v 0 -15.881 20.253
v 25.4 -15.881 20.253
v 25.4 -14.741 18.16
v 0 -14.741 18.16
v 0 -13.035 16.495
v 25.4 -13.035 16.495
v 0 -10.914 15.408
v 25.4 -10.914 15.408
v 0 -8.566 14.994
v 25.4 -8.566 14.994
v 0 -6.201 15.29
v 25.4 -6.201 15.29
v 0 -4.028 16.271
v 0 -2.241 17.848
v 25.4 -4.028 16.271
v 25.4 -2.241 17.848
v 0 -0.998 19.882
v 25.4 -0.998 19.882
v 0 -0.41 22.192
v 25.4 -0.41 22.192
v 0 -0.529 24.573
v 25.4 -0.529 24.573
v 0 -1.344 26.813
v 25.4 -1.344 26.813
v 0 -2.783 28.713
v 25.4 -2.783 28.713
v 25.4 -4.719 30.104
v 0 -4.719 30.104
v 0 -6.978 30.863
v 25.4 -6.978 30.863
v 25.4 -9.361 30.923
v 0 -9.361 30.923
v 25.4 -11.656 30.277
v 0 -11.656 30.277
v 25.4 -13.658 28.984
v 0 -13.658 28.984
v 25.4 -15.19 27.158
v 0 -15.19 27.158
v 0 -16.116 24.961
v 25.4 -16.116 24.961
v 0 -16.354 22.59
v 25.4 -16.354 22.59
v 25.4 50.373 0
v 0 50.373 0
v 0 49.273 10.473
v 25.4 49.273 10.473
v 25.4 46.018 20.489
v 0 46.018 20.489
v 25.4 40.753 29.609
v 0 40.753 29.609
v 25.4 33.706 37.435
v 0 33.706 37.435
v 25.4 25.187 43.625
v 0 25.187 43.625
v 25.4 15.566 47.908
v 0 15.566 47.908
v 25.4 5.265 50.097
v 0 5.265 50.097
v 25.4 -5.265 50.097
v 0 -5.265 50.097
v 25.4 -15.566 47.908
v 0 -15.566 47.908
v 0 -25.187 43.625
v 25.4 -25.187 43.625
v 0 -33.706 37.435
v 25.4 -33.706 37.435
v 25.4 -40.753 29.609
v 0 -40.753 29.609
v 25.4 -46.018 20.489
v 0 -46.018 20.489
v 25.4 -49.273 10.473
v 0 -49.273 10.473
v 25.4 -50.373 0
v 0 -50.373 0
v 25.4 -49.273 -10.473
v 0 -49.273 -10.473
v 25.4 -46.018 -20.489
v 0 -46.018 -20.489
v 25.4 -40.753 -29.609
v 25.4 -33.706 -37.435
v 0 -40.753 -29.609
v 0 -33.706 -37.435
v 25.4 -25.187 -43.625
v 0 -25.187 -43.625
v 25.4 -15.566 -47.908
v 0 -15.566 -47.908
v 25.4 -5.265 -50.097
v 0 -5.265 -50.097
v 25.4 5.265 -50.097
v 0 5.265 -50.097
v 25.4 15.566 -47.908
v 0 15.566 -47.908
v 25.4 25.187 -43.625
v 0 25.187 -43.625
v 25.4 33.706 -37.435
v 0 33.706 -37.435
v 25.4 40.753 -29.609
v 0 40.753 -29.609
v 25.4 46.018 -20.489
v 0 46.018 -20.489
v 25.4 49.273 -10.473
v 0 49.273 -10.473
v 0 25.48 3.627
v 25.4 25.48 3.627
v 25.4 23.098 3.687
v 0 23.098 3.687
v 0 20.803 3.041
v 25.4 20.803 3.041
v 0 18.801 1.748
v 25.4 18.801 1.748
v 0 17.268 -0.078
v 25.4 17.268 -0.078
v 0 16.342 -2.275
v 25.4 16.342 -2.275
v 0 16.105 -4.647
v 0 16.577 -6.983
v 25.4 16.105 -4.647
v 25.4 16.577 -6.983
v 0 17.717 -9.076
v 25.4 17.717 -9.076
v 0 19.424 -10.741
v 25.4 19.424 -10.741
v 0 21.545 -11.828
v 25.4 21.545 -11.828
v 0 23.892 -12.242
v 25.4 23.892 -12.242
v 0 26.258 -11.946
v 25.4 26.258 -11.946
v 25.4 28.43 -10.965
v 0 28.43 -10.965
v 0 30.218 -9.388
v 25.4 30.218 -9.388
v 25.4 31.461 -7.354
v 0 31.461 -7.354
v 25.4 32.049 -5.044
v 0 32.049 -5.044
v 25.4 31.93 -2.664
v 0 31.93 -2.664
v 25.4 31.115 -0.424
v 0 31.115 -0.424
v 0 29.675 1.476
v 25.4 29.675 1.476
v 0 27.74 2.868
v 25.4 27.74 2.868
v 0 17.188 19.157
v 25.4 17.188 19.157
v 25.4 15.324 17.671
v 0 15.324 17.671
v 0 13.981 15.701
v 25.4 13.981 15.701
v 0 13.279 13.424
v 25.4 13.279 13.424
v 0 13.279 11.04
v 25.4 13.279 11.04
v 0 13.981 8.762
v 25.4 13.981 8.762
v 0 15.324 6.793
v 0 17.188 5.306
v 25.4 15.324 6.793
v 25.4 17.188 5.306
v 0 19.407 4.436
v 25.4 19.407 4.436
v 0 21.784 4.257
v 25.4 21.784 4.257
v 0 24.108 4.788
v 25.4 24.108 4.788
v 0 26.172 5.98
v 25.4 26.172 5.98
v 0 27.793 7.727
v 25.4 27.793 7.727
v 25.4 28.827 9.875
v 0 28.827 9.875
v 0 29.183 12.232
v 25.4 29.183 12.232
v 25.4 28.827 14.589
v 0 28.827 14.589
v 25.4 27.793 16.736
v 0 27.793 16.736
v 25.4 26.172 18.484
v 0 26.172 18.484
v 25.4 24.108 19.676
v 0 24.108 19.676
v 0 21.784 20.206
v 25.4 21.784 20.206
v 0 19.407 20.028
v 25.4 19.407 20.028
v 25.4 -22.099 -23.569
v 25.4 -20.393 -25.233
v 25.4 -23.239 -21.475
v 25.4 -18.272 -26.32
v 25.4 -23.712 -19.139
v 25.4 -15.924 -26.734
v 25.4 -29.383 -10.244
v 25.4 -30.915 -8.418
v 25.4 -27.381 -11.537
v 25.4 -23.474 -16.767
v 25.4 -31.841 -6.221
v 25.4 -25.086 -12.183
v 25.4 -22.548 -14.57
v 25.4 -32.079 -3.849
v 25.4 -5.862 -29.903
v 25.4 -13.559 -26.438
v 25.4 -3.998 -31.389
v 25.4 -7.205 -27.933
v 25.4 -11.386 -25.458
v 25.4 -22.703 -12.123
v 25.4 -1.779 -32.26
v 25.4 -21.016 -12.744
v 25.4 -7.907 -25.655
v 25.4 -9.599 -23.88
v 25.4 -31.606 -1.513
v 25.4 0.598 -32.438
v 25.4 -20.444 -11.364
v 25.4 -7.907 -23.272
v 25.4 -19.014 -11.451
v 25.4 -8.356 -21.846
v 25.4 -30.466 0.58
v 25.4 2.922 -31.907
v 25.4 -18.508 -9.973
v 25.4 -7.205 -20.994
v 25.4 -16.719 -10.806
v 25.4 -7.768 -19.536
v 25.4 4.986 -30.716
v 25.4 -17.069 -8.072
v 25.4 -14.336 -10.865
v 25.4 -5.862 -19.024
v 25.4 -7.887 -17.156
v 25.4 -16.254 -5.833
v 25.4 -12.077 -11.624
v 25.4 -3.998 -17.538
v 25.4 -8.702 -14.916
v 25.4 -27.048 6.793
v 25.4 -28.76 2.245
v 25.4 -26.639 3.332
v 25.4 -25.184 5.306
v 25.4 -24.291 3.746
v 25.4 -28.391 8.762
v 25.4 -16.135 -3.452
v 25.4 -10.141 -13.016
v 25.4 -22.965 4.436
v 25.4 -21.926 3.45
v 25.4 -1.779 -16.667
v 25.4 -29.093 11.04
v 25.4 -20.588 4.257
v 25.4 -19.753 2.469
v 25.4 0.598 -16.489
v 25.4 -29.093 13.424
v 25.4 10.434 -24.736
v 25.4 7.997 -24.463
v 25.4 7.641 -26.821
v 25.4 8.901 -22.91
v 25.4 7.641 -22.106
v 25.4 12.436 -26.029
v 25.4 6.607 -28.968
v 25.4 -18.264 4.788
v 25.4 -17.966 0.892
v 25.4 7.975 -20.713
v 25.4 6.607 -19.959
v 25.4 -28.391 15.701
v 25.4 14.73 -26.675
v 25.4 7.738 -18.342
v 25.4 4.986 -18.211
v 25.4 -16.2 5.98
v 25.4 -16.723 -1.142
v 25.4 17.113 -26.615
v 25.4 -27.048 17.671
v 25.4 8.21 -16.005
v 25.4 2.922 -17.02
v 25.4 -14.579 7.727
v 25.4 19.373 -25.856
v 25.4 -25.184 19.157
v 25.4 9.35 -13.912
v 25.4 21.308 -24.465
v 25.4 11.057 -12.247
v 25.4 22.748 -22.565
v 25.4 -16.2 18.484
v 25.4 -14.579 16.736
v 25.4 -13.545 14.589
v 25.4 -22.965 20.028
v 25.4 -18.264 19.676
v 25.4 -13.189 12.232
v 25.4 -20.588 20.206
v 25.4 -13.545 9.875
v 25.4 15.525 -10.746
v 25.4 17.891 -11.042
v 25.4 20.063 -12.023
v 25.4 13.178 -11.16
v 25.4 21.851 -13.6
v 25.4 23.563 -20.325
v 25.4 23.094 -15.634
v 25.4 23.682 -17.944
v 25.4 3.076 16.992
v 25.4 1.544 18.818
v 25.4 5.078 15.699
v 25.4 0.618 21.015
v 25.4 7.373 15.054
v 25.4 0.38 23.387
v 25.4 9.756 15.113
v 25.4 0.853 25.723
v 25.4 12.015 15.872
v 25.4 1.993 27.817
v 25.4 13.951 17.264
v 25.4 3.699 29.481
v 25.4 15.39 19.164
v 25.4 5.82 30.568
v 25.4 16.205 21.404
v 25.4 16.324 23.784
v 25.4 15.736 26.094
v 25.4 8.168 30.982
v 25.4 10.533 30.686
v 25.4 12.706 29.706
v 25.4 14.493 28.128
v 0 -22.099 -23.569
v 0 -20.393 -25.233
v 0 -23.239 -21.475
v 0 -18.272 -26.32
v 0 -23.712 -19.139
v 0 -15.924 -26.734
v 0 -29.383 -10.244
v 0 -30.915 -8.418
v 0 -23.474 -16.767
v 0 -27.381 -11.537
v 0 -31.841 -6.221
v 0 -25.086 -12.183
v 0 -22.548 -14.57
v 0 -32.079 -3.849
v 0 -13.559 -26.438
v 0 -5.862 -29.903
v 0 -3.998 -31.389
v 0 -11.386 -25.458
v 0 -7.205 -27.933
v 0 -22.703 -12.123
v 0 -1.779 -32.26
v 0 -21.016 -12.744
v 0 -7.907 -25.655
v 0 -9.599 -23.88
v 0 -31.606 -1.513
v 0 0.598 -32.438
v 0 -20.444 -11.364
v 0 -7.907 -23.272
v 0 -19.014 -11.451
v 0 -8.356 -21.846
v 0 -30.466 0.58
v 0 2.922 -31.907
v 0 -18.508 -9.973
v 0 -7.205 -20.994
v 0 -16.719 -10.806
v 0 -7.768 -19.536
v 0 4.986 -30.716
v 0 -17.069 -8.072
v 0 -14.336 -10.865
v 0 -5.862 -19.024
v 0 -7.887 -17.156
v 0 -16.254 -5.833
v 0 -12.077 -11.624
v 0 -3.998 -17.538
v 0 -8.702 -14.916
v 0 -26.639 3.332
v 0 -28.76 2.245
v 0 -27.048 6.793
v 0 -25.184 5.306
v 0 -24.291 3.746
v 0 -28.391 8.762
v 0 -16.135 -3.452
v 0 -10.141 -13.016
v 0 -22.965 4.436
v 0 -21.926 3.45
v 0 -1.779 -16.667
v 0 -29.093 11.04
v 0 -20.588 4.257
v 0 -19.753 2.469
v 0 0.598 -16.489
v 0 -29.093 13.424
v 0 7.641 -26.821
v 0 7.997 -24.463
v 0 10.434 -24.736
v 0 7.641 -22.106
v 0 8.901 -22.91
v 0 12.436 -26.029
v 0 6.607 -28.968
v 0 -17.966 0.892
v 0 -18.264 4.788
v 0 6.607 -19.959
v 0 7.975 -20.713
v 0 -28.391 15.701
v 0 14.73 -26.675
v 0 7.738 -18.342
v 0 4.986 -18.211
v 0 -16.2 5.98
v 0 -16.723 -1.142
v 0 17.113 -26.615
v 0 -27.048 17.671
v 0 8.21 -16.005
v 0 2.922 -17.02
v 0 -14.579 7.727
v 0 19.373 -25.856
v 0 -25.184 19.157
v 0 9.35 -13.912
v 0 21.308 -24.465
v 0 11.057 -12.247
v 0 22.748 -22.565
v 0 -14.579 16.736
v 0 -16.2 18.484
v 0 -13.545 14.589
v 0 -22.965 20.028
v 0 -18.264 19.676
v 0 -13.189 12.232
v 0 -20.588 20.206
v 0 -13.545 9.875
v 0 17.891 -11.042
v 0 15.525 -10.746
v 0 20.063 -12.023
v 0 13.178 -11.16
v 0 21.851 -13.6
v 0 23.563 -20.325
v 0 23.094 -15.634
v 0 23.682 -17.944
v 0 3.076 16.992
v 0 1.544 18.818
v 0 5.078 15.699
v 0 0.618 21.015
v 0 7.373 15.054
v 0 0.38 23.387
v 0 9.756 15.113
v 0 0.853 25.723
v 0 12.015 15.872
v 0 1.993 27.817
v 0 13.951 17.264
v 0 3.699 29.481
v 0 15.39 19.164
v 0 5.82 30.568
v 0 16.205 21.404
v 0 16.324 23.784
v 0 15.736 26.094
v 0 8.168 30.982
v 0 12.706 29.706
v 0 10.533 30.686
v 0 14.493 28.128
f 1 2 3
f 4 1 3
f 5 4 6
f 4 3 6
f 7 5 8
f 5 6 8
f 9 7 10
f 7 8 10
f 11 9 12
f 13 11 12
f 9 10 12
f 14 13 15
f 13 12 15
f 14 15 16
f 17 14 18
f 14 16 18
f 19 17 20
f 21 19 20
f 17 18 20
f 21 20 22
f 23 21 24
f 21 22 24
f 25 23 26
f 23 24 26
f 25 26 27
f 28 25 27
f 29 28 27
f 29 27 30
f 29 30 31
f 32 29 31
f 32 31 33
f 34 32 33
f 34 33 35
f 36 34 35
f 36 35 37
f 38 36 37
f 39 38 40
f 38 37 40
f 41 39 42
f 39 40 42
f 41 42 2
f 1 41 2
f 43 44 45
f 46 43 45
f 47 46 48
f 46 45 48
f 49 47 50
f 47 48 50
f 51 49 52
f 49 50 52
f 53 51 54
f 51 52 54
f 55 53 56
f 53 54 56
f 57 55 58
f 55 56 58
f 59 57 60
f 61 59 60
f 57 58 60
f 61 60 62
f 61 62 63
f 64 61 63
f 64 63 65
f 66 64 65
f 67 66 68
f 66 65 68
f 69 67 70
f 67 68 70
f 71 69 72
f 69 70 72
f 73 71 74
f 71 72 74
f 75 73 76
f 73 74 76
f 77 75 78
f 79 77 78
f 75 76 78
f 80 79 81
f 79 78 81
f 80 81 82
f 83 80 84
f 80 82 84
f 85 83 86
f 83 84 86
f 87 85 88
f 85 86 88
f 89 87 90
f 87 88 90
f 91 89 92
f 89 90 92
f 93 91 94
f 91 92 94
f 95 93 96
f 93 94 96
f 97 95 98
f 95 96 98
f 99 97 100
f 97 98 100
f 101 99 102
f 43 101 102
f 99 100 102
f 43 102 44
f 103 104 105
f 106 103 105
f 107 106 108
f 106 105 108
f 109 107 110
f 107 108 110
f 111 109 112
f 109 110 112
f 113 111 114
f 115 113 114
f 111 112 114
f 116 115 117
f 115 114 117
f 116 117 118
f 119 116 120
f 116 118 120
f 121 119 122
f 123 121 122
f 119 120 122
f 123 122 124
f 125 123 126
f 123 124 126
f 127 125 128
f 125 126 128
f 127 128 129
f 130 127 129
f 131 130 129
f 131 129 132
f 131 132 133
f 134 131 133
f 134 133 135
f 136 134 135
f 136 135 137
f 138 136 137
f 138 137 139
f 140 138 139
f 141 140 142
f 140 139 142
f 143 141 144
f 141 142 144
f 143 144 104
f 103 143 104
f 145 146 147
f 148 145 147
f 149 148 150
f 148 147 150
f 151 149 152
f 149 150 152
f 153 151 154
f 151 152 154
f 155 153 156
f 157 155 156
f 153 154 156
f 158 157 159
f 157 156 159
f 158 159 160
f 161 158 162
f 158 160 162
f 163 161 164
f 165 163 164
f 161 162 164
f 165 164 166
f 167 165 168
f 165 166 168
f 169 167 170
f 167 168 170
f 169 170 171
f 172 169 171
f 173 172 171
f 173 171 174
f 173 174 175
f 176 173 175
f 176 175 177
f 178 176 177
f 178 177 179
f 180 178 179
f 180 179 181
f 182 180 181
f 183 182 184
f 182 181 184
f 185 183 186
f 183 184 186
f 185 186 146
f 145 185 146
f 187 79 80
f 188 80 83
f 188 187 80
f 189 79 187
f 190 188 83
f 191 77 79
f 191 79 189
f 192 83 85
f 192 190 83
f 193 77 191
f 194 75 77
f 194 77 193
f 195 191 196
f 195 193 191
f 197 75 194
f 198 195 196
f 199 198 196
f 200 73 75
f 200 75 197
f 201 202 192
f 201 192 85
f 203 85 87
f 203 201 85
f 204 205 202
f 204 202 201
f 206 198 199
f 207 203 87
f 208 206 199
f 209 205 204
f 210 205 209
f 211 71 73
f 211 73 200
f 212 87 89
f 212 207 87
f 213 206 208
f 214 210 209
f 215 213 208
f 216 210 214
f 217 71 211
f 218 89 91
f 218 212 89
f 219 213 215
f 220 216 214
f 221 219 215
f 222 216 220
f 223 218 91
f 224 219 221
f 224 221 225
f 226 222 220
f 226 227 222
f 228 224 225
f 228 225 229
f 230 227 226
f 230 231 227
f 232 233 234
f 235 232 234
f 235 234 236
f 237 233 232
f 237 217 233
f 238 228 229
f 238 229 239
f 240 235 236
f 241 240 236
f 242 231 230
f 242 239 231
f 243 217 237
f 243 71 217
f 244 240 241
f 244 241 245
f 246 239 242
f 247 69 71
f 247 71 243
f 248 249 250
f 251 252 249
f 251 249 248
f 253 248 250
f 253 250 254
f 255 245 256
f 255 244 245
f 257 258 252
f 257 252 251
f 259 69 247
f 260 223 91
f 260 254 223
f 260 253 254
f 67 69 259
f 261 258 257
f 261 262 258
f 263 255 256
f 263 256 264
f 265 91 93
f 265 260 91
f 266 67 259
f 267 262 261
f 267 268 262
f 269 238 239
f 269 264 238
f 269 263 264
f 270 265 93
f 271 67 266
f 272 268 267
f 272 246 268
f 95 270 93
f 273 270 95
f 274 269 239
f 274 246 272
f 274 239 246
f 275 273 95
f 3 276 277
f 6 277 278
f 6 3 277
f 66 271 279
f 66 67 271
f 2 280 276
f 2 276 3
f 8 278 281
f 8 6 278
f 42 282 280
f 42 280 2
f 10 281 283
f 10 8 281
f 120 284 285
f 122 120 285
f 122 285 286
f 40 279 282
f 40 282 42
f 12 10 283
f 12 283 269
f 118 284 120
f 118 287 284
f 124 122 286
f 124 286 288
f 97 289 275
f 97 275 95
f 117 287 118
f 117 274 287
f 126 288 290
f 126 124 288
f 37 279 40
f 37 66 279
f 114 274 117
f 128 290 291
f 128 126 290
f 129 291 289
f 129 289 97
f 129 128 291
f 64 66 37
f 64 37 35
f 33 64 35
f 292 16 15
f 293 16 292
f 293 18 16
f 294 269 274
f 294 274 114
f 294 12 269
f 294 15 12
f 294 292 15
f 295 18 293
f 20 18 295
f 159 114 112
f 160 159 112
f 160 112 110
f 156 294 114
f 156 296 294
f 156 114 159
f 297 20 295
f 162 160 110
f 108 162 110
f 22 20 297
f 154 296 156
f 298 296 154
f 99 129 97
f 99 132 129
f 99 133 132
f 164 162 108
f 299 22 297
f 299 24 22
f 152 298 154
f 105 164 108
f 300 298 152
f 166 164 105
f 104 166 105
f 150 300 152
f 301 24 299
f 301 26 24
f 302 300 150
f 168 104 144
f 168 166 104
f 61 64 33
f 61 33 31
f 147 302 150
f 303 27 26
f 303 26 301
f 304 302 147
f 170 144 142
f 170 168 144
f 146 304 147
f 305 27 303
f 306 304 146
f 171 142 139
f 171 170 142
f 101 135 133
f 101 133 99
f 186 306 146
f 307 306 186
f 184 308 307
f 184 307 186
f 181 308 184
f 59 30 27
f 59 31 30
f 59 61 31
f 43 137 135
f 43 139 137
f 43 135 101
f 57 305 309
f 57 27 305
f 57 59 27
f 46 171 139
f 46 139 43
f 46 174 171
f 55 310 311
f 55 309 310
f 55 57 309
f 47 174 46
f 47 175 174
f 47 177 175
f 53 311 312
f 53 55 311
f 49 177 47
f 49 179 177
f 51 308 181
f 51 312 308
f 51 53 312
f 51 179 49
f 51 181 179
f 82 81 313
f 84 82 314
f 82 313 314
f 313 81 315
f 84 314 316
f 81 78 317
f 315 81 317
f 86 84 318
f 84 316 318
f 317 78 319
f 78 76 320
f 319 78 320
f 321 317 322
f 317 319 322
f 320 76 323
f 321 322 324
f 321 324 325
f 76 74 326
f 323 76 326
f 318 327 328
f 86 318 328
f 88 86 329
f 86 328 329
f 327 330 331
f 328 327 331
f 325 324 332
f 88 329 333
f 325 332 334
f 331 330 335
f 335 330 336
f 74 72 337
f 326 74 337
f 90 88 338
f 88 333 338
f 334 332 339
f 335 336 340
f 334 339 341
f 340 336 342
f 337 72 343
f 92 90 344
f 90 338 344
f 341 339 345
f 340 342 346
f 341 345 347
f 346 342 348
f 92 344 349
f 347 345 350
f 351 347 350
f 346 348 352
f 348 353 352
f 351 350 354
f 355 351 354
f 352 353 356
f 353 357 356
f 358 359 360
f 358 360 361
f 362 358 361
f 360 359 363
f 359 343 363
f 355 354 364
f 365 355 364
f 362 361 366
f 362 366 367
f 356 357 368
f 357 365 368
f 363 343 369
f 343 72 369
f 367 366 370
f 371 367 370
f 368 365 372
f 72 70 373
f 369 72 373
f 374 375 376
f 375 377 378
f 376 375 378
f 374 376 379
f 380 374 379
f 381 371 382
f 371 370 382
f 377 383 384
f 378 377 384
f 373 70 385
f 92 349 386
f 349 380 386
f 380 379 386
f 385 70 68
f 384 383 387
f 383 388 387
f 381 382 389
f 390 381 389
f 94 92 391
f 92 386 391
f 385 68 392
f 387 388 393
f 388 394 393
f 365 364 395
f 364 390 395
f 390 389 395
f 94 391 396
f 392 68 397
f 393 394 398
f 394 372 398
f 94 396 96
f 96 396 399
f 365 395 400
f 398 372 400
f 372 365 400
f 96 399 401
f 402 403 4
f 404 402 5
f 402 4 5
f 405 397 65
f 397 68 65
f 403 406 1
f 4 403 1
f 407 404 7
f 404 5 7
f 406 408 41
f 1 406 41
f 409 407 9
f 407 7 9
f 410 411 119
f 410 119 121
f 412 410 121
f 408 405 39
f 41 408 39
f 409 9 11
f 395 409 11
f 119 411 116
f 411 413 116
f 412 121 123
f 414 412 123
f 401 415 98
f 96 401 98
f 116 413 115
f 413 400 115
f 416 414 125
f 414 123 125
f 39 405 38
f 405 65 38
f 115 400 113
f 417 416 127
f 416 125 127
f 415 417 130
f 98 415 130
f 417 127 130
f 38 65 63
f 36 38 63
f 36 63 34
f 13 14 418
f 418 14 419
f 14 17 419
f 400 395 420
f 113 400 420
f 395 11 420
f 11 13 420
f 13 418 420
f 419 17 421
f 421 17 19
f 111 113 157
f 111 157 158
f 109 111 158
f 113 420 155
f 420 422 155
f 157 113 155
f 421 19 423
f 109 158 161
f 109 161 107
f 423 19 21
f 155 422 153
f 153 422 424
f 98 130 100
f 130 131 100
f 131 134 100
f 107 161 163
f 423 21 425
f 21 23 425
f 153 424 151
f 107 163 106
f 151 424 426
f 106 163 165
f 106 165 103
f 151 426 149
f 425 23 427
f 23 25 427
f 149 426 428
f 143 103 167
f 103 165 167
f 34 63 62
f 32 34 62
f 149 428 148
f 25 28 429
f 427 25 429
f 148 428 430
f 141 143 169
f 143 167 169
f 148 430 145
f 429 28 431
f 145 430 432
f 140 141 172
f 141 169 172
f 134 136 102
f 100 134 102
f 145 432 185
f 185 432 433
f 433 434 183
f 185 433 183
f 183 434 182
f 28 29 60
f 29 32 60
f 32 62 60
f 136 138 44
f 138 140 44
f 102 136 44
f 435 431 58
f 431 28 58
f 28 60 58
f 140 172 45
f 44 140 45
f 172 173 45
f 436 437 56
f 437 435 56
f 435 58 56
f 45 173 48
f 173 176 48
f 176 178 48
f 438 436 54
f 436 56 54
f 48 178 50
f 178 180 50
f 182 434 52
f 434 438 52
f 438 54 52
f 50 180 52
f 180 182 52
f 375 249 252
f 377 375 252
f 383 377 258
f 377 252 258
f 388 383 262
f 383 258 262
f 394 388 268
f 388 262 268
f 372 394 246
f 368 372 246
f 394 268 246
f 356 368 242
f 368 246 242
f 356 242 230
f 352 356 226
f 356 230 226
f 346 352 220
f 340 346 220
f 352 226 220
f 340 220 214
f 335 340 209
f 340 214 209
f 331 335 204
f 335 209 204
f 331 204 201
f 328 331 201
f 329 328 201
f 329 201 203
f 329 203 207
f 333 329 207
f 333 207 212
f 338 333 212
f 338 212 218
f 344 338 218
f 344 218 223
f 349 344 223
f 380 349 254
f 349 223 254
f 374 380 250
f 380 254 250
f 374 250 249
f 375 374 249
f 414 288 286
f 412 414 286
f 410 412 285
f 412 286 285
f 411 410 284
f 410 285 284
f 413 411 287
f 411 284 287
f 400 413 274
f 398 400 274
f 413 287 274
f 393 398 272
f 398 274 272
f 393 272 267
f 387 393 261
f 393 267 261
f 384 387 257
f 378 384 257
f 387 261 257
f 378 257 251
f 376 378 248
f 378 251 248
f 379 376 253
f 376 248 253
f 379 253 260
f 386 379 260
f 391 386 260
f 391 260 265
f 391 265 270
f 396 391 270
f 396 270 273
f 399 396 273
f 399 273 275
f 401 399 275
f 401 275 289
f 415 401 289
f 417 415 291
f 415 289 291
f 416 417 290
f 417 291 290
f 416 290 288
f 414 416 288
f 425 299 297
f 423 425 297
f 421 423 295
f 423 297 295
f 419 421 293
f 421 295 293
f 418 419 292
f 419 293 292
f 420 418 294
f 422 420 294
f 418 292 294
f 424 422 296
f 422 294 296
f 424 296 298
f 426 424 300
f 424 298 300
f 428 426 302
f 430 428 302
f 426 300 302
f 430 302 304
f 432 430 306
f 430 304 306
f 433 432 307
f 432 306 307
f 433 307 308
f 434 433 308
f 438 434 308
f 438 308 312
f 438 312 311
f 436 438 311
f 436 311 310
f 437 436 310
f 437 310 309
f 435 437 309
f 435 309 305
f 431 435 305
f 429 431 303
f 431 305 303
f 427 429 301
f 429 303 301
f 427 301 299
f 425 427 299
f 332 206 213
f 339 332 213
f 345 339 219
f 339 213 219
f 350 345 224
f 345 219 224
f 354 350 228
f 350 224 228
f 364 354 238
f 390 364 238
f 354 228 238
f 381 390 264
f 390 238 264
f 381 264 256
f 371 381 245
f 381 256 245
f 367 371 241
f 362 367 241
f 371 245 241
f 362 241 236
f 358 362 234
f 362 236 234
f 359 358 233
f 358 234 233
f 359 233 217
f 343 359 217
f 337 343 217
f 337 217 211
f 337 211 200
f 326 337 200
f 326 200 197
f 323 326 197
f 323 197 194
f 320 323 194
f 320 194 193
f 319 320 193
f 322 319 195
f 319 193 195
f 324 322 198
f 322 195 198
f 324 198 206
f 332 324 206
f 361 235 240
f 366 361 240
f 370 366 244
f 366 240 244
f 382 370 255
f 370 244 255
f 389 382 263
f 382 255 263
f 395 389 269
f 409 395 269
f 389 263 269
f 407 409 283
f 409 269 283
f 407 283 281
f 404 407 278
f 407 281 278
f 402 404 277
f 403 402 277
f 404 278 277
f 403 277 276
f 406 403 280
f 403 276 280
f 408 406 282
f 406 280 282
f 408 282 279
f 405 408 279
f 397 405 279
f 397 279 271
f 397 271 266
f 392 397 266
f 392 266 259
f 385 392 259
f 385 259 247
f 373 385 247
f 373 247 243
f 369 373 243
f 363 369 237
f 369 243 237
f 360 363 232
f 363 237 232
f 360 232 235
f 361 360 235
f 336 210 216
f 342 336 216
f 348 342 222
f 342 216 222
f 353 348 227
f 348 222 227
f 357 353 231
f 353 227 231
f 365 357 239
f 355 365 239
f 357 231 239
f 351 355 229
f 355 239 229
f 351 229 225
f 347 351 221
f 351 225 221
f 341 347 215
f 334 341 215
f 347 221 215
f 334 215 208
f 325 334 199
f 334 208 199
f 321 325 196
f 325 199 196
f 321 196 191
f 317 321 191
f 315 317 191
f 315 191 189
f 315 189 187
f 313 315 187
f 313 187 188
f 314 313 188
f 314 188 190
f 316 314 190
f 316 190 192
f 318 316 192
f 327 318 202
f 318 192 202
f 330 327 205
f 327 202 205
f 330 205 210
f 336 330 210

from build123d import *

# Parameters (mm, degrees)
F0_R            = 50.3734102362
F1_DEPTH        = 25.4
F2_R            = 7.9966512346
F3_DEPTH        = 25.4
F3_COPIES_COUNT = 9


# Not quite as in the source:
# - a pattern or mirror of a feature is missing from the dataset's text; its kind, count and spacing are read off the source's solid


with BuildPart() as f1:
    # F0 (on Right) → F1 (new body)
    with BuildSketch(Plane.YZ):
        Circle(F0_R)
    extrude(amount=F1_DEPTH)

    # F2 (on face) → F3 (cut)
    with BuildSketch(Plane.YZ.offset(25.4)):
        with Locations((0, -24.4634896517)):
            Circle(F2_R)
    f3 = extrude(amount=-F3_DEPTH, mode=Mode.SUBTRACT)

    # F3_copies: F3 ×9 about axis
    f3_copies_axis = Axis((0, 0, 0), (1, 0, 0))
    for i in range(1, F3_COPIES_COUNT):
        add(f3.rotate(f3_copies_axis, i * 360 / F3_COPIES_COUNT), mode=Mode.SUBTRACT)


solid = f1.part
